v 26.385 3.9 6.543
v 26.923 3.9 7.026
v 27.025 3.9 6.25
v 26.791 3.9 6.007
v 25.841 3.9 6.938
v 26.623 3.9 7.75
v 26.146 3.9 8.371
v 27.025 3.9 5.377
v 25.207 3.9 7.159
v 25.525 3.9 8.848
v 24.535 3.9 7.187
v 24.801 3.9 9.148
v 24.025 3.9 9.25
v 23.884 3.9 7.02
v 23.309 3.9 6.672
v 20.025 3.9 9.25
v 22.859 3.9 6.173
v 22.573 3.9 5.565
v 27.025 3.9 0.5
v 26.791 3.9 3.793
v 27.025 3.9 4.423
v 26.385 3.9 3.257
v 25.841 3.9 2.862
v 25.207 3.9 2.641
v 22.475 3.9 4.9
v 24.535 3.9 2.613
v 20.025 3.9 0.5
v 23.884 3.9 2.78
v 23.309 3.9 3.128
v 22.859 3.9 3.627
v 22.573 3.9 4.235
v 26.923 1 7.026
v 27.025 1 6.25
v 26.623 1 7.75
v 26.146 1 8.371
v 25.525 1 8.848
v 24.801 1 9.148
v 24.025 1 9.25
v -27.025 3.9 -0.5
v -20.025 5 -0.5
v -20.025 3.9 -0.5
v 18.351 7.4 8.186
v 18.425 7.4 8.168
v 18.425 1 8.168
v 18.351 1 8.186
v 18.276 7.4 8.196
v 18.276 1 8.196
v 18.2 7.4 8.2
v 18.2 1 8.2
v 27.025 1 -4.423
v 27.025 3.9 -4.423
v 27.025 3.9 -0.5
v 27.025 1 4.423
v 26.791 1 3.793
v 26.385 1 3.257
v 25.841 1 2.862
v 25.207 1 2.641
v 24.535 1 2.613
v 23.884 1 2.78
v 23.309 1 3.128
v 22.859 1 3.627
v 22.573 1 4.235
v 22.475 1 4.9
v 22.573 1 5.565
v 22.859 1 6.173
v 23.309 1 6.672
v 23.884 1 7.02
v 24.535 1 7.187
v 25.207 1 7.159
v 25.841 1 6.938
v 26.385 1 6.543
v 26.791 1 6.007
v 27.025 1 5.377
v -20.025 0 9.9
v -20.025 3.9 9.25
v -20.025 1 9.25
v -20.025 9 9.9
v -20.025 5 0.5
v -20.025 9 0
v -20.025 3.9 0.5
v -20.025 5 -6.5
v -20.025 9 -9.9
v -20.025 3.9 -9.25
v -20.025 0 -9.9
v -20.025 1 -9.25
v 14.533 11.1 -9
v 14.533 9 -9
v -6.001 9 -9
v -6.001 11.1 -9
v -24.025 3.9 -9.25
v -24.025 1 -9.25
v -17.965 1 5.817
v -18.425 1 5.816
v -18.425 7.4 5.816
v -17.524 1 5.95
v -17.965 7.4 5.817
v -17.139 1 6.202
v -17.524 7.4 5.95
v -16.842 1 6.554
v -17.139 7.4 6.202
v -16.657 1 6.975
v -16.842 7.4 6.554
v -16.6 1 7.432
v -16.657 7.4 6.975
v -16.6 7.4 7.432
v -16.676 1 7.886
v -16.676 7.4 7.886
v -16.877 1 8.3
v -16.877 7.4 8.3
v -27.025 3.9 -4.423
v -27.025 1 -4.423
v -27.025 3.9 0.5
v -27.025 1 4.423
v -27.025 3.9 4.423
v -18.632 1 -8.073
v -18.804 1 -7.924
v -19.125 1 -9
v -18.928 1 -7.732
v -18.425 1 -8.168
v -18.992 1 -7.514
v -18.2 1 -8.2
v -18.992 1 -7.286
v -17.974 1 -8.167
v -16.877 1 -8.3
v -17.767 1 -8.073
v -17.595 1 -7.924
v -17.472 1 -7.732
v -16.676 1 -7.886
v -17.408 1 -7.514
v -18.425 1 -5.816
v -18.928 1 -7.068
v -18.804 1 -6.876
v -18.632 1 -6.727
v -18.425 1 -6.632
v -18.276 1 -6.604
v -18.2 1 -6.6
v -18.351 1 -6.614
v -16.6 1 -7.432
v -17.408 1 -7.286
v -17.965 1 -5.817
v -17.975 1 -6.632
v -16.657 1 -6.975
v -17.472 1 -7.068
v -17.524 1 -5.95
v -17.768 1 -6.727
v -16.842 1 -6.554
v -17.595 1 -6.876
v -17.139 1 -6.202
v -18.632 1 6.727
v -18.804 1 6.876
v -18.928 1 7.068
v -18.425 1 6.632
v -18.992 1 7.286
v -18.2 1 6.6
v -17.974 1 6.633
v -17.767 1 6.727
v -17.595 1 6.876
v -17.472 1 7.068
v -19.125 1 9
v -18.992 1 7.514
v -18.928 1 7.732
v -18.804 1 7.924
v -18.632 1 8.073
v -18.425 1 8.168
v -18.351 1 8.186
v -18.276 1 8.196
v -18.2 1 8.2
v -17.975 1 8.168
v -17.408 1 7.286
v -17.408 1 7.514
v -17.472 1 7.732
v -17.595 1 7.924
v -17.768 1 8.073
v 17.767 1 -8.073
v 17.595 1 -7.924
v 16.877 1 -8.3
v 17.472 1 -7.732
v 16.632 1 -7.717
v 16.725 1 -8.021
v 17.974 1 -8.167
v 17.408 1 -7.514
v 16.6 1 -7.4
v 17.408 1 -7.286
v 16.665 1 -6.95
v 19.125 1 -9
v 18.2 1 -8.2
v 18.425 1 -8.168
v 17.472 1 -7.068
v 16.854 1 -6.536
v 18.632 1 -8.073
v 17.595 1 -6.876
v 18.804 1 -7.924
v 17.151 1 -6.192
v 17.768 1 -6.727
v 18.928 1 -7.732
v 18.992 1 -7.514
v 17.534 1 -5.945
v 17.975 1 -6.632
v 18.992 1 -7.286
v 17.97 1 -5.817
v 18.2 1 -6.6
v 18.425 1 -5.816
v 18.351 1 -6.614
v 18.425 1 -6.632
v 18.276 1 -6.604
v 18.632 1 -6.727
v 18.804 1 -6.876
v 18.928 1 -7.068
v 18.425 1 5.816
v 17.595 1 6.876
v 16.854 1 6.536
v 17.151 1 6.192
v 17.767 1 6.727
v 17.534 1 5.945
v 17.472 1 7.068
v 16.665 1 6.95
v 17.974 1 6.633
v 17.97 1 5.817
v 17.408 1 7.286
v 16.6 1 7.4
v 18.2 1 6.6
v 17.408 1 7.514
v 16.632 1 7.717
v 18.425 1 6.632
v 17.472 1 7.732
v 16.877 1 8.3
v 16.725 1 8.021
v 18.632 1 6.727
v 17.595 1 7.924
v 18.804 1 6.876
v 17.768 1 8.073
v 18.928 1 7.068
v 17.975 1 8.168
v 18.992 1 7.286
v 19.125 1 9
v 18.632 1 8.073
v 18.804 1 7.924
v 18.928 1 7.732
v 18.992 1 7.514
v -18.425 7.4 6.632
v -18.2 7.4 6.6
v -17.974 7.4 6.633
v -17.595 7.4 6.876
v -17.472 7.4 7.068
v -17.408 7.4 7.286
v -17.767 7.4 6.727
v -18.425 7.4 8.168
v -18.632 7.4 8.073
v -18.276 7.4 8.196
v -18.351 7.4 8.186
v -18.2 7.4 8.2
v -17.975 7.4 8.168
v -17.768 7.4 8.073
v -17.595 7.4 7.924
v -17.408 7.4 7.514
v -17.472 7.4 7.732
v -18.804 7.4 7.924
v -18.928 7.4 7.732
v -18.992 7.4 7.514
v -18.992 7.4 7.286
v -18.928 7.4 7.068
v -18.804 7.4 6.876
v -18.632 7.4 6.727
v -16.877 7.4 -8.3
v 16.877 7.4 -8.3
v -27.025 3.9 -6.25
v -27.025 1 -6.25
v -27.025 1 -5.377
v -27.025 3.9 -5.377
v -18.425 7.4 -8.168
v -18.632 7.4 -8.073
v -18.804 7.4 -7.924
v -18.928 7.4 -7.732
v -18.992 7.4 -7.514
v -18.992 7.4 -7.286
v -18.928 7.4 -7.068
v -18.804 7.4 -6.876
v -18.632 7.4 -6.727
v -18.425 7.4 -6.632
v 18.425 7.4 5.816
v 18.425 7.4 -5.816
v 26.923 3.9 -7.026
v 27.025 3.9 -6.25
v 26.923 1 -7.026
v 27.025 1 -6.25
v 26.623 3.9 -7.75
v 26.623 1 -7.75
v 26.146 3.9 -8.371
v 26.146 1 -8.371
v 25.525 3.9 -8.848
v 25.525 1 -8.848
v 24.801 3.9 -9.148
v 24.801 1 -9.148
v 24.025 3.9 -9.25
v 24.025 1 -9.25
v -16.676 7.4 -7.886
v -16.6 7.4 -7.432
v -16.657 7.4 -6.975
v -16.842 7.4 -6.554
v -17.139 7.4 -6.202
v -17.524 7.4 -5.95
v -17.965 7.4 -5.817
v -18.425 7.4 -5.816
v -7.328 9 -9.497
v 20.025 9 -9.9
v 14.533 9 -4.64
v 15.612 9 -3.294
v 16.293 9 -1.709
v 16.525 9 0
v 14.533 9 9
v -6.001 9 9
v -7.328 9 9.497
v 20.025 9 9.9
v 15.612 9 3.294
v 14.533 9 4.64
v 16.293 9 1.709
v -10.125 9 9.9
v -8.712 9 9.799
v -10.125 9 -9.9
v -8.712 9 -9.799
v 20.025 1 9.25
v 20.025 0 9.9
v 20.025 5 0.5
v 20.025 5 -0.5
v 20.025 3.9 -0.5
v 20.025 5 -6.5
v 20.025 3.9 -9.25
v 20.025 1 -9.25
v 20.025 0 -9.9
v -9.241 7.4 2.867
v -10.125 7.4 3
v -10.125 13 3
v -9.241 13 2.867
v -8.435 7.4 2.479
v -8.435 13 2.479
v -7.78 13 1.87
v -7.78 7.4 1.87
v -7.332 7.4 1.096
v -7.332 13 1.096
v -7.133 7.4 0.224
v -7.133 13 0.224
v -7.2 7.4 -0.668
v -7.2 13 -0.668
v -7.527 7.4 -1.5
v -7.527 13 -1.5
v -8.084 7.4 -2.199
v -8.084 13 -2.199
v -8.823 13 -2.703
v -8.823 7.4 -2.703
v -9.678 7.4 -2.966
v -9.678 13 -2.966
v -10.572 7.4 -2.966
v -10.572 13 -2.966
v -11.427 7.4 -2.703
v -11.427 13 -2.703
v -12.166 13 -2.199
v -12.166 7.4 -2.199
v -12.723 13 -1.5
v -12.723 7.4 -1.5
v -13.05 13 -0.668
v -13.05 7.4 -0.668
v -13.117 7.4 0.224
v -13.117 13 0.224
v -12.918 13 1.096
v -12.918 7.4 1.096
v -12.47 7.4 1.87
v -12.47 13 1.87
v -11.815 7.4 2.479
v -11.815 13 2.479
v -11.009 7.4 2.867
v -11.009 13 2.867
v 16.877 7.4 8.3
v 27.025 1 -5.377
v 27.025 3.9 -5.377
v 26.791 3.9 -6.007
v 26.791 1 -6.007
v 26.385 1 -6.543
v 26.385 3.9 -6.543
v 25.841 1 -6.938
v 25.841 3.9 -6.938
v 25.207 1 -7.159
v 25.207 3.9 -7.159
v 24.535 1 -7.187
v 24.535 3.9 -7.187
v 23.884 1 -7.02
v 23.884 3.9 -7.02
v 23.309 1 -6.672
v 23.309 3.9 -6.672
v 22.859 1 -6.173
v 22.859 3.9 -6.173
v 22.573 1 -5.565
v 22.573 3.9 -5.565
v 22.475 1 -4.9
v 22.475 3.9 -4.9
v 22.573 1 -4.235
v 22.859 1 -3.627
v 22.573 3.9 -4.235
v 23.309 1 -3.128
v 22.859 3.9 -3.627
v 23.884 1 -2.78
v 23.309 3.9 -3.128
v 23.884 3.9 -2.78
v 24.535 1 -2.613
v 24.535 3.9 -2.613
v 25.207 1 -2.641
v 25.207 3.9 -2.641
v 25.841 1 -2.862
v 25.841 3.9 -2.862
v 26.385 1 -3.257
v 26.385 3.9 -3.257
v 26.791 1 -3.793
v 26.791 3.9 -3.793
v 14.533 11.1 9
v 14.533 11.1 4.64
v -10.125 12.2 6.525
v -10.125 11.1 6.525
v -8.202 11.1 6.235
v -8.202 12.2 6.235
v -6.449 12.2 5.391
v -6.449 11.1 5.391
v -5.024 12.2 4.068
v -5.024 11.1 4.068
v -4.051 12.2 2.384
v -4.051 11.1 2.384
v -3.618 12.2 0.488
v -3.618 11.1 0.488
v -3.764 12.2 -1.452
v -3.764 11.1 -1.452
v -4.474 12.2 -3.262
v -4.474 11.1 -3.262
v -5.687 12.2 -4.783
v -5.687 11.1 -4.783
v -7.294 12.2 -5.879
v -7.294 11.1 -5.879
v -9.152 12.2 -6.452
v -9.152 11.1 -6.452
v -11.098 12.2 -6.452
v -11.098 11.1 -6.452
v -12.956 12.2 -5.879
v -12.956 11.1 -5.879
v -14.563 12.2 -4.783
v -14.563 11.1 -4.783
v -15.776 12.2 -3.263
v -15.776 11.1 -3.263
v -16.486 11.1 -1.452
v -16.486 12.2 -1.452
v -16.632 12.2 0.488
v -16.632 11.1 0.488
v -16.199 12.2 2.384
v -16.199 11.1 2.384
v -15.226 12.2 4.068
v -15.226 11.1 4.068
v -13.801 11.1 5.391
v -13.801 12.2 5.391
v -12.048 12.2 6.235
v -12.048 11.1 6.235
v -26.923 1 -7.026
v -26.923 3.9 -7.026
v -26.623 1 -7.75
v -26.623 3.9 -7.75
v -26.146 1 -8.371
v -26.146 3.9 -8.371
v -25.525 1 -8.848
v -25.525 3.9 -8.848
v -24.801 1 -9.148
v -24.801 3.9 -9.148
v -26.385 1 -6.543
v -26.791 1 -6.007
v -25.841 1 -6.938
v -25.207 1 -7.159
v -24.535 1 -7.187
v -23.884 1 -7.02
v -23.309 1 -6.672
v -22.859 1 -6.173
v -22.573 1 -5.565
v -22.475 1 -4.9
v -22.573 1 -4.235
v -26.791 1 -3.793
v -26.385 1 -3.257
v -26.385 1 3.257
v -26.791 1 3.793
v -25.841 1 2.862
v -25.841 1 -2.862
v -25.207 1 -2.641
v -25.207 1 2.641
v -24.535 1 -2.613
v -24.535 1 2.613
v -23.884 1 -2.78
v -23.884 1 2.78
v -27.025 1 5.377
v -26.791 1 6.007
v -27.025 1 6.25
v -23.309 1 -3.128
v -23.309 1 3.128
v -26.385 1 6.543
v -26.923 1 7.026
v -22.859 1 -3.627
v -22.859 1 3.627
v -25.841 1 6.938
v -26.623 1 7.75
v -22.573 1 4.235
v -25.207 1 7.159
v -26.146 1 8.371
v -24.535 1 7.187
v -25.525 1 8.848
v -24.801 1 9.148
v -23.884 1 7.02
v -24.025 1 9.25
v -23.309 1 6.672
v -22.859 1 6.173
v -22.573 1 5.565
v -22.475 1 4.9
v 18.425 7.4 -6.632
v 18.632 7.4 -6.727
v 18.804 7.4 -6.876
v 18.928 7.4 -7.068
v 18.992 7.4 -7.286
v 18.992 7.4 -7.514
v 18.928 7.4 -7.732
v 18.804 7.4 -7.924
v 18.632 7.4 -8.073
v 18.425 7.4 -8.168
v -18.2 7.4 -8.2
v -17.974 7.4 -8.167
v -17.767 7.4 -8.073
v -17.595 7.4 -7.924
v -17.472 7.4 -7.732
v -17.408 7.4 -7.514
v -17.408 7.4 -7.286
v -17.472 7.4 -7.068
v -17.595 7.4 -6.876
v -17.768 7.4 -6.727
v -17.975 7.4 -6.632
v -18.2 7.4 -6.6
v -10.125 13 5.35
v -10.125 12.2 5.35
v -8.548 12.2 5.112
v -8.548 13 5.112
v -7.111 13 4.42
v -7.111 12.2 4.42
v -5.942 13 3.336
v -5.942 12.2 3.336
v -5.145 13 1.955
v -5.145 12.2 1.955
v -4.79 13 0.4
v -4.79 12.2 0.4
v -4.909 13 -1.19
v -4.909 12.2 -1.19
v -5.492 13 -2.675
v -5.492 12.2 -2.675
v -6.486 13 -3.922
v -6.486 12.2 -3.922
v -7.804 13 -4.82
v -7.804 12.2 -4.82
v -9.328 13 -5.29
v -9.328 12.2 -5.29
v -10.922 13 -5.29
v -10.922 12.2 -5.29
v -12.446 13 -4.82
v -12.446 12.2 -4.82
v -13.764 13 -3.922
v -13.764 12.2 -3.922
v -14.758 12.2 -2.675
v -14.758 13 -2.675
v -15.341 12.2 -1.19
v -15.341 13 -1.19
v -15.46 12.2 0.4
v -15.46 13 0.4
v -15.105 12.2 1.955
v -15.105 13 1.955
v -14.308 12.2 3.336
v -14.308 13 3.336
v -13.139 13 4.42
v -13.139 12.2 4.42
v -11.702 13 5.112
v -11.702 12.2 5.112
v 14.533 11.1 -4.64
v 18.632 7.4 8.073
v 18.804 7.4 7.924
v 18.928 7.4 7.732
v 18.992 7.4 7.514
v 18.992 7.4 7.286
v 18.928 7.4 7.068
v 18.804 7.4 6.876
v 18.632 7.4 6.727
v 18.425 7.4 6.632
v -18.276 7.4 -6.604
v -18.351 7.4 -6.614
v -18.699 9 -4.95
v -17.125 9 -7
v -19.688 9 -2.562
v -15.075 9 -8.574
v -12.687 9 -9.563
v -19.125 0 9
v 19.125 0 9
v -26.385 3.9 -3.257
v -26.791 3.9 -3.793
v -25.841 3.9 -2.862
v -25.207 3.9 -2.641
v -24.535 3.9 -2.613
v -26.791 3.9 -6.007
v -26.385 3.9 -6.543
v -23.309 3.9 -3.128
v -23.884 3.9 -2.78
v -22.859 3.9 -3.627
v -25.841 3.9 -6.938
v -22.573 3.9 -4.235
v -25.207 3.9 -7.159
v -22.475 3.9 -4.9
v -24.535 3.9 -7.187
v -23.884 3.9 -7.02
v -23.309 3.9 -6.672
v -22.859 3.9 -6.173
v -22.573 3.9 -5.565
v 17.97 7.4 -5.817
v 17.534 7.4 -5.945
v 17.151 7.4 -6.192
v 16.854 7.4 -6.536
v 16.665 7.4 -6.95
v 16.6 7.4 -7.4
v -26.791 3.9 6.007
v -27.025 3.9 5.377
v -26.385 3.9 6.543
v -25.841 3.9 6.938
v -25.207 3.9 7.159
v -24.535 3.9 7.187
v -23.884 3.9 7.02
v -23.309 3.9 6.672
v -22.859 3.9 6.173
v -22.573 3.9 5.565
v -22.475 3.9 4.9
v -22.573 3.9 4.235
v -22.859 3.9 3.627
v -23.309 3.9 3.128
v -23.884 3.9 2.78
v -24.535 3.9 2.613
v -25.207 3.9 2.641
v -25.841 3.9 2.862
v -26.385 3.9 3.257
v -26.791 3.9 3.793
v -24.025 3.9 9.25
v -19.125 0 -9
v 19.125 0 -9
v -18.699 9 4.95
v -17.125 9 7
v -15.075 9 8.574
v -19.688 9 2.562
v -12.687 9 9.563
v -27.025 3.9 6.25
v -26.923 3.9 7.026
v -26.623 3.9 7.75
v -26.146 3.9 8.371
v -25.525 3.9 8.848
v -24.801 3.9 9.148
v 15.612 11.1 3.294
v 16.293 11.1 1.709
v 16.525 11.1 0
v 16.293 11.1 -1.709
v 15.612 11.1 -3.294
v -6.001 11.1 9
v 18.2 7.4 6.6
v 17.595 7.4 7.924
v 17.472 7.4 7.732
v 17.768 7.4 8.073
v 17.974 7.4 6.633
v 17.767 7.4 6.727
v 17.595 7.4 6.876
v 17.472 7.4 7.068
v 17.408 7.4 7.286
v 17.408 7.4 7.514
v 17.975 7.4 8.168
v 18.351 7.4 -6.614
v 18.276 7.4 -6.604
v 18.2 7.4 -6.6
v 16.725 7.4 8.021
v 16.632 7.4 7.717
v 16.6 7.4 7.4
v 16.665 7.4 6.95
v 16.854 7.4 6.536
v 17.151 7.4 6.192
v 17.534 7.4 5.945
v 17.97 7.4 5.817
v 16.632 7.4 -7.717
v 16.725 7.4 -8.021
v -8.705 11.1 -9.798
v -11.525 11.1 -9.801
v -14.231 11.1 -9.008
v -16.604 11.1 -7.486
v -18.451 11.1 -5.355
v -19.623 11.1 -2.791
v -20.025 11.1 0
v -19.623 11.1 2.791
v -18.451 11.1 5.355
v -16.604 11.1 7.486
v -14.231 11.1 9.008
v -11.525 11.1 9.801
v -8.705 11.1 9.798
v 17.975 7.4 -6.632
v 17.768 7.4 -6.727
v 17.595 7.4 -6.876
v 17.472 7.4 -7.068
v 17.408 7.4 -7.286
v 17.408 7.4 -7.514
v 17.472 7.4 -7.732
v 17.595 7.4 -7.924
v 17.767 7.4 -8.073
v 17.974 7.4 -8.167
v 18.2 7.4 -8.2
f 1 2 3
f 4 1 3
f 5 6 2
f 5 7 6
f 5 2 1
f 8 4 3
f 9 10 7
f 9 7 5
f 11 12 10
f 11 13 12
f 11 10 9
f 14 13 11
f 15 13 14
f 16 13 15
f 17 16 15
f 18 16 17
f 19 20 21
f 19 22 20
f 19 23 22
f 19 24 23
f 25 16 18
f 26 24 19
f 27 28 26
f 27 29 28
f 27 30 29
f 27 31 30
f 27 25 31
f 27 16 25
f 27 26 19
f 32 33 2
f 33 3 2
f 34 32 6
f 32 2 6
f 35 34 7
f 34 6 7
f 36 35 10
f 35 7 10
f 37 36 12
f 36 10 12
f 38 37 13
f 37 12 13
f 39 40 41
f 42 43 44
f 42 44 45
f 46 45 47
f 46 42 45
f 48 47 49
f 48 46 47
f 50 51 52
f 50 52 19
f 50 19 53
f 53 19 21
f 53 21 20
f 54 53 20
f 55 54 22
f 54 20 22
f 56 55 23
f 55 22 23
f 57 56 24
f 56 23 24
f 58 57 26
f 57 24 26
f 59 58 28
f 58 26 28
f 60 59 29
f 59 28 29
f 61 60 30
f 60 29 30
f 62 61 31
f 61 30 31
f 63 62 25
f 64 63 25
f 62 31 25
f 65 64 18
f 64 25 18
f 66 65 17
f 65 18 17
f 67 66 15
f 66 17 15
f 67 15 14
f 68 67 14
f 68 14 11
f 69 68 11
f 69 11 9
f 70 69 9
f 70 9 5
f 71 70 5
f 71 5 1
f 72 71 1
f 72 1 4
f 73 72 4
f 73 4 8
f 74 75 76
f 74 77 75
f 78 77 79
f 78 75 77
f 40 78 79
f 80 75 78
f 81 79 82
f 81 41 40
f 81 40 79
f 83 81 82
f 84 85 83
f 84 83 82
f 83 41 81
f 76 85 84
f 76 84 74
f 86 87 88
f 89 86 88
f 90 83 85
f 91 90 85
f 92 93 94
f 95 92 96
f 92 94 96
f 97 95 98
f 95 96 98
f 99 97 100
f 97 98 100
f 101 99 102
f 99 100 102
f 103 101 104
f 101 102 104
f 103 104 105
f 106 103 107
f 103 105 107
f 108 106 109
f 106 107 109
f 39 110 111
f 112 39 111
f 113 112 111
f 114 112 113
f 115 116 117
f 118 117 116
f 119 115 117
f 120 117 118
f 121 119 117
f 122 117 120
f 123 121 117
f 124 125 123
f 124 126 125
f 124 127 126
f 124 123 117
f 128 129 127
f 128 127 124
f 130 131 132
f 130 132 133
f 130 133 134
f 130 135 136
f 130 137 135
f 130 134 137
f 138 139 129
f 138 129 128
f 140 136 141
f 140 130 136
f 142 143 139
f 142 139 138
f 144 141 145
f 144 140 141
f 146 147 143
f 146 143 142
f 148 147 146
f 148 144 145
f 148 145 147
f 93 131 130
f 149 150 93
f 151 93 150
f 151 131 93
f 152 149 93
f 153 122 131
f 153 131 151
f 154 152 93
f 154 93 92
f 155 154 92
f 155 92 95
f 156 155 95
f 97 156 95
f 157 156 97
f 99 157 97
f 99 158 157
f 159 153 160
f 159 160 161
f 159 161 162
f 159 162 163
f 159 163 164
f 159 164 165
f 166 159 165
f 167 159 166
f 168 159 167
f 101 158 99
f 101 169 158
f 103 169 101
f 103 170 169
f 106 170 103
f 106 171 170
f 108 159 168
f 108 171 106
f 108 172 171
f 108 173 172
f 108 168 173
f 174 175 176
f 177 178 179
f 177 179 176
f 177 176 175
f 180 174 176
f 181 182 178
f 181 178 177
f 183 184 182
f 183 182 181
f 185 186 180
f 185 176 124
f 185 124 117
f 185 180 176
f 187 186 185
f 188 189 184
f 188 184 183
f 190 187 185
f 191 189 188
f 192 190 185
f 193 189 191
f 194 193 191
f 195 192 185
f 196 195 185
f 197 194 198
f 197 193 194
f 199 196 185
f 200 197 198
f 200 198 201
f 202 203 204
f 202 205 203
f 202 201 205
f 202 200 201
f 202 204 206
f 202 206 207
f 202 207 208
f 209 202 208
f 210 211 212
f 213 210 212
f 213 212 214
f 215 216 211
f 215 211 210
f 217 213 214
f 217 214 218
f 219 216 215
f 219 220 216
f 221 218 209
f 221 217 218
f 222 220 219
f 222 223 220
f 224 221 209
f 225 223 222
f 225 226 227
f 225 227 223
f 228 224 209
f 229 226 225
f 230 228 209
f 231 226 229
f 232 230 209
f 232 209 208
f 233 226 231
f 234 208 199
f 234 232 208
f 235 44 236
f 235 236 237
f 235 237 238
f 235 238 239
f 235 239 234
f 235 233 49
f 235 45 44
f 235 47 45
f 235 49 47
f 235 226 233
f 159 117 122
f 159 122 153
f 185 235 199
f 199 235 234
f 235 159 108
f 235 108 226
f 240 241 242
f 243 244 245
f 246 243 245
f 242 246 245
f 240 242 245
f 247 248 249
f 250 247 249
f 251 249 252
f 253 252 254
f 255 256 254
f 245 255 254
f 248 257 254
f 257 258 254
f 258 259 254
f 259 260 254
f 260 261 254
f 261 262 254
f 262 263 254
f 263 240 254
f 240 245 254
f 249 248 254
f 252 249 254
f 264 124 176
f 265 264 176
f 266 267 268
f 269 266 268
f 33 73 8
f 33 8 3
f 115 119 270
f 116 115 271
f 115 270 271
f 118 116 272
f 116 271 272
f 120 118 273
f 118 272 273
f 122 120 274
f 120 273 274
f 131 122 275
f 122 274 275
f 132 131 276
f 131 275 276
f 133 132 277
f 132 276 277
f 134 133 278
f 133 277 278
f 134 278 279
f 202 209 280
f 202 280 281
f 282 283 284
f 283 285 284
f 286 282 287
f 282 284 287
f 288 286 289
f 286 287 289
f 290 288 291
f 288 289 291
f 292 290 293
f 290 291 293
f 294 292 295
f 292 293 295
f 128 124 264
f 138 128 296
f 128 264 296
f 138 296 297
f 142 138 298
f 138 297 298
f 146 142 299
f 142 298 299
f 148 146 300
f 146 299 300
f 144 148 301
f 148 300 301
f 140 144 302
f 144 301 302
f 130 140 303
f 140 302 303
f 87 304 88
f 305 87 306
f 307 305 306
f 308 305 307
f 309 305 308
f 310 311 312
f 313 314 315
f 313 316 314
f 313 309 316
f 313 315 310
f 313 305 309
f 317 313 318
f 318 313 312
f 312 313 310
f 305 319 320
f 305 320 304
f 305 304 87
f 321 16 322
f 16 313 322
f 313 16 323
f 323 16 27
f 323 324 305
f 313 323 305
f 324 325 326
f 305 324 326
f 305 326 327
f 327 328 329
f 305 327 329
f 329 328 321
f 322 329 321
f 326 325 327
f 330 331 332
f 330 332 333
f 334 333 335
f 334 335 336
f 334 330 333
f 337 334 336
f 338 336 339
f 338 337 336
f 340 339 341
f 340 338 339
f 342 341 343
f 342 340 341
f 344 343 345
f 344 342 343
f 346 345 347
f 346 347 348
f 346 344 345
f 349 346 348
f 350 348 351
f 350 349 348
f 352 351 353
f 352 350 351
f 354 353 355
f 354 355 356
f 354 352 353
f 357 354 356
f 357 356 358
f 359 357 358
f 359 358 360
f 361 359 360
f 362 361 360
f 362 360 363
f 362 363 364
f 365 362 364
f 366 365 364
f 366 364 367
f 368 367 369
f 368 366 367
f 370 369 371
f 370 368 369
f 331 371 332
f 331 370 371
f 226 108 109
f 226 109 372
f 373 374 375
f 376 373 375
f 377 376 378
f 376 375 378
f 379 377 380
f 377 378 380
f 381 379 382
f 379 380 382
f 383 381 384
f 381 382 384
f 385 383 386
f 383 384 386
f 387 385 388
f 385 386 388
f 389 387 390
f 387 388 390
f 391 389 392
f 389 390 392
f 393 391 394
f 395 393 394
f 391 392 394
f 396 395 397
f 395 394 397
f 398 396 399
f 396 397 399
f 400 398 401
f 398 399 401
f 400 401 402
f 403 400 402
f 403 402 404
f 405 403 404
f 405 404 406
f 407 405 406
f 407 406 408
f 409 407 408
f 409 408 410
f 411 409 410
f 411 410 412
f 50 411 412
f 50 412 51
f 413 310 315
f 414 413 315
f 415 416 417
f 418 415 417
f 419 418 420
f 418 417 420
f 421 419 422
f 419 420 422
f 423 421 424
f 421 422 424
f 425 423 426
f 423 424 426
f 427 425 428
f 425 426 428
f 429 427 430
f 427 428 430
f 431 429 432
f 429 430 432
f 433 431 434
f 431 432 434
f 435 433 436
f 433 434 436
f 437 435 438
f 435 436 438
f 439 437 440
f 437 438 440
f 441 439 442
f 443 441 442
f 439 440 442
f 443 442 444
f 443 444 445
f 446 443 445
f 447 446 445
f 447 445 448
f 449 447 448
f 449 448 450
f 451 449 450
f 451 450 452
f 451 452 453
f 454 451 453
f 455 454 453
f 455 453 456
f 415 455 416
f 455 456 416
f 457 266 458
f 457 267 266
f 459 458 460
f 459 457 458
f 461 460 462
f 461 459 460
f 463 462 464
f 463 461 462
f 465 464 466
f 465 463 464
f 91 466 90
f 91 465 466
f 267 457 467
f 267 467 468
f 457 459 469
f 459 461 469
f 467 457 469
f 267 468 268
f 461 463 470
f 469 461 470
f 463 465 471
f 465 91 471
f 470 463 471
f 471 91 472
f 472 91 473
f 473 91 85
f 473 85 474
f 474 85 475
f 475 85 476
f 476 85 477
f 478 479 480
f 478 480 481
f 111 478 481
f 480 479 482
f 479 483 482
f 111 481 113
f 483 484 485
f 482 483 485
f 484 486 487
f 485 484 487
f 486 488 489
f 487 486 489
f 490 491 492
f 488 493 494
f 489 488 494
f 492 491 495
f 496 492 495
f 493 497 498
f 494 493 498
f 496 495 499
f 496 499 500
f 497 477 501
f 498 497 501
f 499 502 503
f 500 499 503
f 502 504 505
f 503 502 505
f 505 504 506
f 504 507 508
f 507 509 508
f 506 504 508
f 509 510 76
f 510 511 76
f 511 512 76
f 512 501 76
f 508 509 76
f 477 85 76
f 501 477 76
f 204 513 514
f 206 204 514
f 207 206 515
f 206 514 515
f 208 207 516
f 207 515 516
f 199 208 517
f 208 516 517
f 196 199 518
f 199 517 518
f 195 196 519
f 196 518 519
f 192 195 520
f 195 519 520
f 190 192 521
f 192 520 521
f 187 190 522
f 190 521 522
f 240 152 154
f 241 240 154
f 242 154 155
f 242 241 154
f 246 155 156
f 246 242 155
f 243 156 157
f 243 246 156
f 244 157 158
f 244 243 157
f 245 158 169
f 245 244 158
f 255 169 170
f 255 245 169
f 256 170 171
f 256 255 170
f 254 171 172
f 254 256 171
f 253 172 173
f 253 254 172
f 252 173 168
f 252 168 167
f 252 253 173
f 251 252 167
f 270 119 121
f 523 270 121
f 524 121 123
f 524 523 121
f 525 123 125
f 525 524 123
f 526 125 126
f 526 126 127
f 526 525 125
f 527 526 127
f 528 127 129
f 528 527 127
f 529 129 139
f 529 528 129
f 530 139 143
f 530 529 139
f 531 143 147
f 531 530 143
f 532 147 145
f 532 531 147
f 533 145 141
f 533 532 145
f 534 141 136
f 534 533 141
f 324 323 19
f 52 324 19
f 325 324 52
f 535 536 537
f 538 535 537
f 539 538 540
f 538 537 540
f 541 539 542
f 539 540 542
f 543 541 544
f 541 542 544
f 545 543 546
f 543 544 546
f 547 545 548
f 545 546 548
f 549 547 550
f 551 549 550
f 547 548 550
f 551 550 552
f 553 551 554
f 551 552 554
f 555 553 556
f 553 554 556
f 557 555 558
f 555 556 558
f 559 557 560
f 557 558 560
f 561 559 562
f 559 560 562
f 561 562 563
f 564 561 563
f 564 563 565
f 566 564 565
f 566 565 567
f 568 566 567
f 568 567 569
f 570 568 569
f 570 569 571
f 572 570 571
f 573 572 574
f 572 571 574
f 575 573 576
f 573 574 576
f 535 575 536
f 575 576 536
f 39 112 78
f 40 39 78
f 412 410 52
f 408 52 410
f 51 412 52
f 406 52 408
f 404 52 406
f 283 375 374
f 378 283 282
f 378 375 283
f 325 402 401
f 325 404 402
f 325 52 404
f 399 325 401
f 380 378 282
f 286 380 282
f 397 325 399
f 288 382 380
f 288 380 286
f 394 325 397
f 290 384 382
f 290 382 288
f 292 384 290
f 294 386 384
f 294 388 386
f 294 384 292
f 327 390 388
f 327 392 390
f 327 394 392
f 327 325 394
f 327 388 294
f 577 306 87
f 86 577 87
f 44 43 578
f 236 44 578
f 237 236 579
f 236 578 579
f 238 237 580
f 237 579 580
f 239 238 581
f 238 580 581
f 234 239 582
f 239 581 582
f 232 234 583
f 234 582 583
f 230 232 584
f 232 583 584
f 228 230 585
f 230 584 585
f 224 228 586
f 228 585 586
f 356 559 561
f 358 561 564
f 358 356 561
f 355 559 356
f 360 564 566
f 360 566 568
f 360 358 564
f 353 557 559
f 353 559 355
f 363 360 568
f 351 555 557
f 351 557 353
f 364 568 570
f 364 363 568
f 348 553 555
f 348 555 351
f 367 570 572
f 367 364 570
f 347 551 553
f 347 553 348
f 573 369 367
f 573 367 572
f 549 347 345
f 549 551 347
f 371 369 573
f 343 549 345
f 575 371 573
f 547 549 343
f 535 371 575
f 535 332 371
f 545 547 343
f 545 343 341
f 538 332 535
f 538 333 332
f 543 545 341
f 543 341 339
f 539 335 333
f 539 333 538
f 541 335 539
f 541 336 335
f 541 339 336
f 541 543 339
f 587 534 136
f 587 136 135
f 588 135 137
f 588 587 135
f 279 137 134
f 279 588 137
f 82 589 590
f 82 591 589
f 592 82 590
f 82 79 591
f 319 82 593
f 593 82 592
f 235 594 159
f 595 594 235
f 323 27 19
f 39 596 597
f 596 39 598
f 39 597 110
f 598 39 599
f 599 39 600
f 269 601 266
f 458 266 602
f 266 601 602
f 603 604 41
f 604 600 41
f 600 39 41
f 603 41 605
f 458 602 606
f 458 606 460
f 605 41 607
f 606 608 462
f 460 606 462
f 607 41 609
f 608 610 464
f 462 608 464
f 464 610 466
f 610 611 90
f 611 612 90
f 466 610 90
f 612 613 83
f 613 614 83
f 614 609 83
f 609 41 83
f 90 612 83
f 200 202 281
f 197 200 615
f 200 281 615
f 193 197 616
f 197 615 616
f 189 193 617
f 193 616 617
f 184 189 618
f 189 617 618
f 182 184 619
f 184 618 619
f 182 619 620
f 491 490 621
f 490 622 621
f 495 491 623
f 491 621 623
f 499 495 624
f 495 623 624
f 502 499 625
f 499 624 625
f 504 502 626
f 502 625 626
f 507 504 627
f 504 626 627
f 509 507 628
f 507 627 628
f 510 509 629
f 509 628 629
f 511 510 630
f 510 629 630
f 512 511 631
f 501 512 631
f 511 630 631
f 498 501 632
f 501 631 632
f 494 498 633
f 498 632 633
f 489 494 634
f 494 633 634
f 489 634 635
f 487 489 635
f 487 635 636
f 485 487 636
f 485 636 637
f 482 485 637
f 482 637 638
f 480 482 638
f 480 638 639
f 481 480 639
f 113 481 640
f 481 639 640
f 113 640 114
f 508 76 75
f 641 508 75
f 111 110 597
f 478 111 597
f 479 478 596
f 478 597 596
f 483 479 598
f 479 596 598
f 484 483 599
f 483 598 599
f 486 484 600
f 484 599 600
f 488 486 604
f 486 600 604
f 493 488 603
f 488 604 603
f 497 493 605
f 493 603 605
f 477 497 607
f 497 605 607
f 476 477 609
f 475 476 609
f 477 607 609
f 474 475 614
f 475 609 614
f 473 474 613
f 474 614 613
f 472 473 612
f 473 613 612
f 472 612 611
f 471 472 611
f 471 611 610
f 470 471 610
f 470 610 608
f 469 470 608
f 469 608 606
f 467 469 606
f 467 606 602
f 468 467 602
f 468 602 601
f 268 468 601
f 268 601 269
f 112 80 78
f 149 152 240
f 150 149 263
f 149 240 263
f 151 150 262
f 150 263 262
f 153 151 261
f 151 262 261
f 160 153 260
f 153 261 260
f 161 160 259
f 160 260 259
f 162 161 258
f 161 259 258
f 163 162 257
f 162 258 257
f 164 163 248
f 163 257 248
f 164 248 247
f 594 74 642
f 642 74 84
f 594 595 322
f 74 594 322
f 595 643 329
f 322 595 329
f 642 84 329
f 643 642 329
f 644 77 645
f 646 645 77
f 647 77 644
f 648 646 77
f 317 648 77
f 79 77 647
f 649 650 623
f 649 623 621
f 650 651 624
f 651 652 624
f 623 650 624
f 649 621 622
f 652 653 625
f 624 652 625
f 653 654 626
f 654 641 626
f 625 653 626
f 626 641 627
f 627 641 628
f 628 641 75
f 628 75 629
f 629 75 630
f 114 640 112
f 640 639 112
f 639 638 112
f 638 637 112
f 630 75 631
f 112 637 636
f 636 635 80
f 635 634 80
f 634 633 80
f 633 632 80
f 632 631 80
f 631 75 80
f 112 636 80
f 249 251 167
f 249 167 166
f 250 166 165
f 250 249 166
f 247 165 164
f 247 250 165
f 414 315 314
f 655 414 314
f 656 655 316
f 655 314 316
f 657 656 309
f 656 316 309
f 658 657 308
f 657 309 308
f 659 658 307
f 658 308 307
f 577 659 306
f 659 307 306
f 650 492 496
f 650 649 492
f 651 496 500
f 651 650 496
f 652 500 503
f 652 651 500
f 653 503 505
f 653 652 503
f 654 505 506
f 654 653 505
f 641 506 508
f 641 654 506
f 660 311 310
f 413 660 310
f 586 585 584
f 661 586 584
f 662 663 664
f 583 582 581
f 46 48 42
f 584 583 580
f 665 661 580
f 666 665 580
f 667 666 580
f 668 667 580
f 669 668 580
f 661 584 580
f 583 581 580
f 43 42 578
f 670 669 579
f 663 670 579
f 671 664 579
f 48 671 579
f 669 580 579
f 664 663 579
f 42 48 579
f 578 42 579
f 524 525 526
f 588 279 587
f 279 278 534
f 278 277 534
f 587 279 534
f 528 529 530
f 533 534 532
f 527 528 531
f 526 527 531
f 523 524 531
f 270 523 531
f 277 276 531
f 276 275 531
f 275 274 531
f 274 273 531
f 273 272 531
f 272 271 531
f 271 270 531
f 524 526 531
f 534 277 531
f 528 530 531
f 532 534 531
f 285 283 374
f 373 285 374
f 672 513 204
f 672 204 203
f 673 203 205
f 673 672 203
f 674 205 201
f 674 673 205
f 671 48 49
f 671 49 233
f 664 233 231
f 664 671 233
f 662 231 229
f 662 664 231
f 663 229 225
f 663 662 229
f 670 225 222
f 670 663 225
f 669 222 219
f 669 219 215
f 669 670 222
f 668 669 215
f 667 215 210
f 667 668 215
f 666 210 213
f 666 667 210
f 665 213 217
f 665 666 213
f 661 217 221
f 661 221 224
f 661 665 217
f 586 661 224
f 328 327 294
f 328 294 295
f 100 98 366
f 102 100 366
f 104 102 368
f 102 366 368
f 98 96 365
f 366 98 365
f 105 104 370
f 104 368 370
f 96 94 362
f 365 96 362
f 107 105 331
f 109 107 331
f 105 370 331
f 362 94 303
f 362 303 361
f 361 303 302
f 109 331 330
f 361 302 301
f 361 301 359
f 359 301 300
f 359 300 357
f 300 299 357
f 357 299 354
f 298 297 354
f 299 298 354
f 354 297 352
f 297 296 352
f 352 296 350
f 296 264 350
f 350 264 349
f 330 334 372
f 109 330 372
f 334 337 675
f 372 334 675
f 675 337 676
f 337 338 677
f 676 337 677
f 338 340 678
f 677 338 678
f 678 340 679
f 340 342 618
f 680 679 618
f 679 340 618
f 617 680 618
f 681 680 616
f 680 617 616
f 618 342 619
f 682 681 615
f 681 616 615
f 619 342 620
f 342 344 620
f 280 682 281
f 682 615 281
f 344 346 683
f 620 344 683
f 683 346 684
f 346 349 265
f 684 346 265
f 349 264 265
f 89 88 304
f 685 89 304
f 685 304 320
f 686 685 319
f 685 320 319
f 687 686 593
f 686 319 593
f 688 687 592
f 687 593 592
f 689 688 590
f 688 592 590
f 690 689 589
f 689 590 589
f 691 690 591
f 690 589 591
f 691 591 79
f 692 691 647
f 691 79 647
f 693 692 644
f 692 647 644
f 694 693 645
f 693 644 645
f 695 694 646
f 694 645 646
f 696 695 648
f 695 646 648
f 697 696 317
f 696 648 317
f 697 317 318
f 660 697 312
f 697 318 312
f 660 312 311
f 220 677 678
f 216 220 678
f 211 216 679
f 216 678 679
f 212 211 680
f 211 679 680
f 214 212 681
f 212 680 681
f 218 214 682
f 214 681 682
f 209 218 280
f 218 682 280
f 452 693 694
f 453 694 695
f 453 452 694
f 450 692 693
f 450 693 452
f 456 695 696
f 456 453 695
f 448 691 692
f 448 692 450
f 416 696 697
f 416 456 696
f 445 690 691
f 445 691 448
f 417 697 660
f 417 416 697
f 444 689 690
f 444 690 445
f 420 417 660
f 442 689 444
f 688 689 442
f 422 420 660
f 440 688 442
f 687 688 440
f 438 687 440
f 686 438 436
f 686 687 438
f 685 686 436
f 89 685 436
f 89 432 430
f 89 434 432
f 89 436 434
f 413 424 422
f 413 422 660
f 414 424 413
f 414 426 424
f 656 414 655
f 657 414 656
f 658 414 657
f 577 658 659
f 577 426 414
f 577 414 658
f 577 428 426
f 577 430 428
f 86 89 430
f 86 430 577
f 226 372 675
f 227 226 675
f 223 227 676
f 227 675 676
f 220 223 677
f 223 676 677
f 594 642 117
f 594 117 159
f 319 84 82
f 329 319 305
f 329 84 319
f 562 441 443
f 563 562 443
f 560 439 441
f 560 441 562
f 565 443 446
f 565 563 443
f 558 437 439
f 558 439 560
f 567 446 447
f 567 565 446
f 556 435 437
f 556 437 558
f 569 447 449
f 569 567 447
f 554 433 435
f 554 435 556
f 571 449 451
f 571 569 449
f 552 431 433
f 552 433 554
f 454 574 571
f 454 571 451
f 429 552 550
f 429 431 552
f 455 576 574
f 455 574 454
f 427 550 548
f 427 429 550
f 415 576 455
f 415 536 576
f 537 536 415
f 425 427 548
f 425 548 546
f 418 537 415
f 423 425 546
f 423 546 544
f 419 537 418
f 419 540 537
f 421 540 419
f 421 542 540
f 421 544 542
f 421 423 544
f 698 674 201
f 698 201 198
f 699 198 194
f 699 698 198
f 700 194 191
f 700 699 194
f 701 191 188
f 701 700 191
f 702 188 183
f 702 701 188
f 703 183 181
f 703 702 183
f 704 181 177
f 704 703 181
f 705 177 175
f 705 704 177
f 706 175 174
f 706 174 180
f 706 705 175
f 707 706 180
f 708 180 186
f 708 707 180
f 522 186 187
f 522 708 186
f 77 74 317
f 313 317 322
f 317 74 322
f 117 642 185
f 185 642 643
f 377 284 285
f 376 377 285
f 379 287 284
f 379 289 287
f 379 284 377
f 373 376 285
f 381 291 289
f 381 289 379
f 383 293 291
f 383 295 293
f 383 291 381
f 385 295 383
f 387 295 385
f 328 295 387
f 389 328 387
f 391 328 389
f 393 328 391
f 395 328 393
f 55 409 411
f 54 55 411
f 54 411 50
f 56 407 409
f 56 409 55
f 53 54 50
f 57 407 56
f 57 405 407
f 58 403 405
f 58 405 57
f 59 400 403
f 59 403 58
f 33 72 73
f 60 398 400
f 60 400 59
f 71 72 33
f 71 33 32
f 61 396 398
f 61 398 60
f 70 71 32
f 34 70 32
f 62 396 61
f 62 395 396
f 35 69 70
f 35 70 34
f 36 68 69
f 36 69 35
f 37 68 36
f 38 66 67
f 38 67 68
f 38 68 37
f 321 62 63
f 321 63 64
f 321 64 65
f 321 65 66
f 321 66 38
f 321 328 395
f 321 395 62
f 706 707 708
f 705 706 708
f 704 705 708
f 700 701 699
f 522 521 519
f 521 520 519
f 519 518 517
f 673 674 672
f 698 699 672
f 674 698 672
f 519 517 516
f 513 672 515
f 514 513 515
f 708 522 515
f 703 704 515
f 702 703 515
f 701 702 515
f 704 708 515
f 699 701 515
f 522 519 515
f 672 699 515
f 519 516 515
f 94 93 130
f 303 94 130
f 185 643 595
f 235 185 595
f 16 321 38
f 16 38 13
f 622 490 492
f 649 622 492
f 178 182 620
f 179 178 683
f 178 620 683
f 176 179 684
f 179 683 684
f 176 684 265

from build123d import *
from build123d.topology import SkipClean

# Parameters (mm, degrees)
SKETCH_1_W          = 40.05
SKETCH_1_H          = 19.8
EXTRUDE_1_DEPTH     = 9
SHELL_1_T           = -1.6
SKETCH_2_W          = 38.25
SKETCH_2_H          = 18
CUT_EXTRUDE_1_DEPTH = 1
EXTRUDE_2_DEPTH     = 2.1
SKETCH_4_R          = 6.525
EXTRUDE_3_DEPTH     = 1.1
SKETCH_5_R          = 5.35
EXTRUDE_4_DEPTH     = 0.8
CUT_EXTRUDE_START   = -5.6
SKETCH_6_R          = 3
CUT_EXTRUDE_2_DEPTH = 5.6
SKETCH_7_R          = 0.8
CUT_EXTRUDE_3_DEPTH = 14
SKETCH_8_R          = 1.6
SKETCH_8_R_2        = 0.8
EXTRUDE_5_DEPTH     = 6.4
SKETCH_9_R          = 0.8
EXTRUDE_6_DEPTH     = 1.6
EXTRUDE_7_DEPTH     = 7
CUT_EXTRUDE_4_DEPTH = 7
SKETCH_12_R         = 2.3
CUT_EXTRUDE_5_DEPTH = 7
EXTRUDE_8_DEPTH     = 7
SKETCH_16_R         = 2.3
CUT_EXTRUDE_6_DEPTH = 7
FILLET_1_R          = 3
CUT_EXTRUDE_7_DEPTH = 7


with BuildPart() as part:
    # Эскиз1 → Бобышка-Вытянуть1 (new body)
    with BuildSketch(Plane(origin=(0, 0, 0), x_dir=(1, 0, 0), z_dir=(0, 1, 0))):
        Rectangle(SKETCH_1_W, SKETCH_1_H)
    extrude(amount=EXTRUDE_1_DEPTH)

    # Оболочка1
    shell_1_openings = [part.faces().sort_by_distance(p)[0] for p in [
        (0, 0, 0),
    ]]
    offset(amount=SHELL_1_T, openings=shell_1_openings, kind=Kind.INTERSECTION)

    # Эскиз2 → Вырез-Вытянуть1 (cut)
    with BuildSketch(Plane.XZ):
        Rectangle(SKETCH_2_W, SKETCH_2_H)
    extrude(amount=-CUT_EXTRUDE_1_DEPTH, mode=Mode.SUBTRACT)

    # Эскиз3 → Бобышка-Вытянуть2 (add)
    with BuildSketch(Plane(origin=(0, 9, 0), x_dir=(1, 0, 0), z_dir=(0, 1, 0))):
        with BuildLine():
            Line((14.532872835, 4.640113908), (14.532872835, 9))
            Line((14.532872835, 9), (-6.000681875, 9))
            ThreePointArc((-6.000681875, 9), (-20.025, 0), (-6.000681875, -9))
            Line((-6.000681875, -9), (14.532872835, -9))
            Line((14.532872835, -9), (14.532872835, -4.640113908))
            ThreePointArc((14.532872835, -4.640113908), (16.525, 0), (14.532872835, 4.640113908))
        make_face()
    extrude(amount=EXTRUDE_2_DEPTH)

    # Эскиз4 → Бобышка-Вытянуть3 (add)
    with BuildSketch(Plane(origin=(0, 11.1, 0), x_dir=(1, 0, 0), z_dir=(0, 1, 0))):
        with Locations(Location((-10.125, 0, 0), (0, 0, 270))):
            Circle(SKETCH_4_R)
    extrude(amount=EXTRUDE_3_DEPTH)

    # Эскиз5 → Бобышка-Вытянуть4 (add)
    with BuildSketch(Plane(origin=(0, 12.2, 0), x_dir=(1, 0, 0), z_dir=(0, 1, 0))):
        with Locations(Location((-10.125, 0, 0), (0, 0, 270))):
            Circle(SKETCH_5_R)
    extrude(amount=EXTRUDE_4_DEPTH)

    # Эскиз6 → Вырез-Вытянуть2 (cut)
    with BuildSketch(Plane(origin=(0, 13, 0), x_dir=(1, 0, 0), z_dir=(0, 1, 0)).offset(CUT_EXTRUDE_START)):
        with Locations(Location((-10.125, 0, 0), (0, 0, 270))):
            Circle(SKETCH_6_R)
    extrude(amount=CUT_EXTRUDE_2_DEPTH, mode=Mode.SUBTRACT)

    # Эскиз7 → Вырез-Вытянуть3 (cut)
    with BuildSketch(Plane(origin=(0, 11.1, 0), x_dir=(1, 0, 0), z_dir=(0, 1, 0))):
        with Locations(Location((-18.2, 7.4, 0), (0, 0, 253.665177219))):
            Circle(SKETCH_7_R)
        with Locations(Location((18.2, 7.4, 0), (0, 0, 286.334822781))):
            Circle(SKETCH_7_R)
        with Locations(Location((18.2, -7.4, 0), (0, 0, 286.334822781))):
            Circle(SKETCH_7_R)
        with Locations(Location((-18.2, -7.4, 0), (0, 0, 253.665177219))):
            Circle(SKETCH_7_R)
    extrude(amount=-CUT_EXTRUDE_3_DEPTH, mode=Mode.SUBTRACT)

    # Эскиз8 → Бобышка-Вытянуть5 (add)
    # profile 1 of 4: a face of its own
    with SkipClean():  # the faces are left unmerged after this step: merging them gives an invalid solid
        with BuildSketch(Plane(origin=(0, 7.4, 0), x_dir=(-1, 0, 0), z_dir=(0, -1, 0))):
            with Locations((18.2, -7.4)):
                Circle(SKETCH_8_R)
            with Locations(Location((18.2, -7.4, 0), (0, 0, 270))):
                Circle(SKETCH_8_R_2, mode=Mode.SUBTRACT)
        # profile 2 of 4: a face of its own
        with BuildSketch(Plane(origin=(0, 7.4, 0), x_dir=(-1, 0, 0), z_dir=(0, -1, 0))):
            with Locations((18.2, 7.4)):
                Circle(SKETCH_8_R)
            with Locations(Location((18.2, 7.4, 0), (0, 0, 270))):
                Circle(SKETCH_8_R_2, mode=Mode.SUBTRACT)
        # profile 3 of 4: a face of its own
        with BuildSketch(Plane(origin=(0, 7.4, 0), x_dir=(-1, 0, 0), z_dir=(0, -1, 0))):
            with Locations((-18.2, 7.4)):
                Circle(SKETCH_8_R)
            with Locations(Location((-18.2, 7.4, 0), (0, 0, 270))):
                Circle(SKETCH_8_R_2, mode=Mode.SUBTRACT)
        # profile 4 of 4: a face of its own
        with BuildSketch(Plane(origin=(0, 7.4, 0), x_dir=(-1, 0, 0), z_dir=(0, -1, 0))):
            with Locations((-18.2, -7.4)):
                Circle(SKETCH_8_R)
            with Locations(Location((-18.2, -7.4, 0), (0, 0, 270))):
                Circle(SKETCH_8_R_2, mode=Mode.SUBTRACT)
        extrude(amount=EXTRUDE_5_DEPTH)

    # Эскиз9 → Бобышка-Вытянуть6 (add)
    with BuildSketch(Plane(origin=(0, 9, 0), x_dir=(1, 0, 0), z_dir=(0, 1, 0))):
        with Locations(Location((18.2, 7.4, 0), (0, 0, 270))):
            Circle(SKETCH_9_R)
        with Locations(Location((18.2, -7.4, 0), (0, 0, 270))):
            Circle(SKETCH_9_R)
        with Locations(Location((-18.2, -7.4, 0), (0, 0, 270))):
            Circle(SKETCH_9_R)
        with Locations(Location((-18.2, 7.4, 0), (0, 0, 270))):
            Circle(SKETCH_9_R)
    extrude(amount=-EXTRUDE_6_DEPTH)

    # Эскиз10 → Бобышка-Вытянуть7 (add)
    with BuildSketch(Plane(origin=(20.025, 0, 0), x_dir=(0, 0, -1), z_dir=(1, 0, 0))):
        Polygon((9.25, 1), (-9.25, 1), (-9.25, 3.9), (-0.5, 3.9), (-0.5, 5), (0.5, 5), (0.5, 3.9), (9.25, 3.9), align=None)
    extrude(amount=EXTRUDE_7_DEPTH)

    # Эскиз11 → Вырез-Вытянуть4 (cut)
    with BuildSketch(Plane.XY.offset(0.5)):
        Polygon((20.025, 5), (27.025, 3.9), (27.025, 5), align=None)
    extrude(amount=-CUT_EXTRUDE_4_DEPTH, mode=Mode.SUBTRACT)

    # Эскиз12 → Вырез-Вытянуть5 (cut)
    with BuildSketch(Plane(origin=(0, 3.9, 0), x_dir=(1, 0, 0), z_dir=(0, 1, 0))):
        with Locations((24.775, -4.9)):
            Circle(SKETCH_12_R)
        with Locations((24.775, 4.9)):
            Circle(SKETCH_12_R)
    extrude(amount=-CUT_EXTRUDE_5_DEPTH, mode=Mode.SUBTRACT)

    # Эскиз15 → Бобышка-Вытянуть8 (add)
    with BuildSketch(Plane.ZY.offset(20.025)):
        Polygon((-0.5, 3.9), (-9.25, 3.9), (-9.25, 1), (9.25, 1), (9.25, 3.9), (0.5, 3.9), (0.5, 5), (-0.5, 5), align=None)
    extrude(amount=EXTRUDE_8_DEPTH)

    # Эскиз16 → Вырез-Вытянуть6 (cut)
    with BuildSketch(Plane(origin=(0, 3.9, 0), x_dir=(1, 0, 0), z_dir=(0, 1, 0))):
        with Locations((-24.775, 4.9)):
            Circle(SKETCH_16_R)
        with Locations((-24.775, -4.9)):
            Circle(SKETCH_16_R)
    extrude(amount=-CUT_EXTRUDE_6_DEPTH, mode=Mode.SUBTRACT)

    # Скругление1
    fillet_1_edges = [part.edges().sort_by_distance(p)[0] for p in [
        (27.025, 2.45, -9.25),
        (27.025, 2.45, 9.25),
        (-27.025, 2.45, 9.25),
        (-27.025, 2.45, -9.25),
    ]]
    fillet(fillet_1_edges, radius=FILLET_1_R)

    # Эскиз17 → Вырез-Вытянуть7 (cut)
    with BuildSketch(Plane.XY.offset(0.5)):
        Polygon((-27.025, 3.9), (-20.025, 5), (-27.025, 5), align=None)
    extrude(amount=-CUT_EXTRUDE_7_DEPTH, mode=Mode.SUBTRACT)


solid = part.part
